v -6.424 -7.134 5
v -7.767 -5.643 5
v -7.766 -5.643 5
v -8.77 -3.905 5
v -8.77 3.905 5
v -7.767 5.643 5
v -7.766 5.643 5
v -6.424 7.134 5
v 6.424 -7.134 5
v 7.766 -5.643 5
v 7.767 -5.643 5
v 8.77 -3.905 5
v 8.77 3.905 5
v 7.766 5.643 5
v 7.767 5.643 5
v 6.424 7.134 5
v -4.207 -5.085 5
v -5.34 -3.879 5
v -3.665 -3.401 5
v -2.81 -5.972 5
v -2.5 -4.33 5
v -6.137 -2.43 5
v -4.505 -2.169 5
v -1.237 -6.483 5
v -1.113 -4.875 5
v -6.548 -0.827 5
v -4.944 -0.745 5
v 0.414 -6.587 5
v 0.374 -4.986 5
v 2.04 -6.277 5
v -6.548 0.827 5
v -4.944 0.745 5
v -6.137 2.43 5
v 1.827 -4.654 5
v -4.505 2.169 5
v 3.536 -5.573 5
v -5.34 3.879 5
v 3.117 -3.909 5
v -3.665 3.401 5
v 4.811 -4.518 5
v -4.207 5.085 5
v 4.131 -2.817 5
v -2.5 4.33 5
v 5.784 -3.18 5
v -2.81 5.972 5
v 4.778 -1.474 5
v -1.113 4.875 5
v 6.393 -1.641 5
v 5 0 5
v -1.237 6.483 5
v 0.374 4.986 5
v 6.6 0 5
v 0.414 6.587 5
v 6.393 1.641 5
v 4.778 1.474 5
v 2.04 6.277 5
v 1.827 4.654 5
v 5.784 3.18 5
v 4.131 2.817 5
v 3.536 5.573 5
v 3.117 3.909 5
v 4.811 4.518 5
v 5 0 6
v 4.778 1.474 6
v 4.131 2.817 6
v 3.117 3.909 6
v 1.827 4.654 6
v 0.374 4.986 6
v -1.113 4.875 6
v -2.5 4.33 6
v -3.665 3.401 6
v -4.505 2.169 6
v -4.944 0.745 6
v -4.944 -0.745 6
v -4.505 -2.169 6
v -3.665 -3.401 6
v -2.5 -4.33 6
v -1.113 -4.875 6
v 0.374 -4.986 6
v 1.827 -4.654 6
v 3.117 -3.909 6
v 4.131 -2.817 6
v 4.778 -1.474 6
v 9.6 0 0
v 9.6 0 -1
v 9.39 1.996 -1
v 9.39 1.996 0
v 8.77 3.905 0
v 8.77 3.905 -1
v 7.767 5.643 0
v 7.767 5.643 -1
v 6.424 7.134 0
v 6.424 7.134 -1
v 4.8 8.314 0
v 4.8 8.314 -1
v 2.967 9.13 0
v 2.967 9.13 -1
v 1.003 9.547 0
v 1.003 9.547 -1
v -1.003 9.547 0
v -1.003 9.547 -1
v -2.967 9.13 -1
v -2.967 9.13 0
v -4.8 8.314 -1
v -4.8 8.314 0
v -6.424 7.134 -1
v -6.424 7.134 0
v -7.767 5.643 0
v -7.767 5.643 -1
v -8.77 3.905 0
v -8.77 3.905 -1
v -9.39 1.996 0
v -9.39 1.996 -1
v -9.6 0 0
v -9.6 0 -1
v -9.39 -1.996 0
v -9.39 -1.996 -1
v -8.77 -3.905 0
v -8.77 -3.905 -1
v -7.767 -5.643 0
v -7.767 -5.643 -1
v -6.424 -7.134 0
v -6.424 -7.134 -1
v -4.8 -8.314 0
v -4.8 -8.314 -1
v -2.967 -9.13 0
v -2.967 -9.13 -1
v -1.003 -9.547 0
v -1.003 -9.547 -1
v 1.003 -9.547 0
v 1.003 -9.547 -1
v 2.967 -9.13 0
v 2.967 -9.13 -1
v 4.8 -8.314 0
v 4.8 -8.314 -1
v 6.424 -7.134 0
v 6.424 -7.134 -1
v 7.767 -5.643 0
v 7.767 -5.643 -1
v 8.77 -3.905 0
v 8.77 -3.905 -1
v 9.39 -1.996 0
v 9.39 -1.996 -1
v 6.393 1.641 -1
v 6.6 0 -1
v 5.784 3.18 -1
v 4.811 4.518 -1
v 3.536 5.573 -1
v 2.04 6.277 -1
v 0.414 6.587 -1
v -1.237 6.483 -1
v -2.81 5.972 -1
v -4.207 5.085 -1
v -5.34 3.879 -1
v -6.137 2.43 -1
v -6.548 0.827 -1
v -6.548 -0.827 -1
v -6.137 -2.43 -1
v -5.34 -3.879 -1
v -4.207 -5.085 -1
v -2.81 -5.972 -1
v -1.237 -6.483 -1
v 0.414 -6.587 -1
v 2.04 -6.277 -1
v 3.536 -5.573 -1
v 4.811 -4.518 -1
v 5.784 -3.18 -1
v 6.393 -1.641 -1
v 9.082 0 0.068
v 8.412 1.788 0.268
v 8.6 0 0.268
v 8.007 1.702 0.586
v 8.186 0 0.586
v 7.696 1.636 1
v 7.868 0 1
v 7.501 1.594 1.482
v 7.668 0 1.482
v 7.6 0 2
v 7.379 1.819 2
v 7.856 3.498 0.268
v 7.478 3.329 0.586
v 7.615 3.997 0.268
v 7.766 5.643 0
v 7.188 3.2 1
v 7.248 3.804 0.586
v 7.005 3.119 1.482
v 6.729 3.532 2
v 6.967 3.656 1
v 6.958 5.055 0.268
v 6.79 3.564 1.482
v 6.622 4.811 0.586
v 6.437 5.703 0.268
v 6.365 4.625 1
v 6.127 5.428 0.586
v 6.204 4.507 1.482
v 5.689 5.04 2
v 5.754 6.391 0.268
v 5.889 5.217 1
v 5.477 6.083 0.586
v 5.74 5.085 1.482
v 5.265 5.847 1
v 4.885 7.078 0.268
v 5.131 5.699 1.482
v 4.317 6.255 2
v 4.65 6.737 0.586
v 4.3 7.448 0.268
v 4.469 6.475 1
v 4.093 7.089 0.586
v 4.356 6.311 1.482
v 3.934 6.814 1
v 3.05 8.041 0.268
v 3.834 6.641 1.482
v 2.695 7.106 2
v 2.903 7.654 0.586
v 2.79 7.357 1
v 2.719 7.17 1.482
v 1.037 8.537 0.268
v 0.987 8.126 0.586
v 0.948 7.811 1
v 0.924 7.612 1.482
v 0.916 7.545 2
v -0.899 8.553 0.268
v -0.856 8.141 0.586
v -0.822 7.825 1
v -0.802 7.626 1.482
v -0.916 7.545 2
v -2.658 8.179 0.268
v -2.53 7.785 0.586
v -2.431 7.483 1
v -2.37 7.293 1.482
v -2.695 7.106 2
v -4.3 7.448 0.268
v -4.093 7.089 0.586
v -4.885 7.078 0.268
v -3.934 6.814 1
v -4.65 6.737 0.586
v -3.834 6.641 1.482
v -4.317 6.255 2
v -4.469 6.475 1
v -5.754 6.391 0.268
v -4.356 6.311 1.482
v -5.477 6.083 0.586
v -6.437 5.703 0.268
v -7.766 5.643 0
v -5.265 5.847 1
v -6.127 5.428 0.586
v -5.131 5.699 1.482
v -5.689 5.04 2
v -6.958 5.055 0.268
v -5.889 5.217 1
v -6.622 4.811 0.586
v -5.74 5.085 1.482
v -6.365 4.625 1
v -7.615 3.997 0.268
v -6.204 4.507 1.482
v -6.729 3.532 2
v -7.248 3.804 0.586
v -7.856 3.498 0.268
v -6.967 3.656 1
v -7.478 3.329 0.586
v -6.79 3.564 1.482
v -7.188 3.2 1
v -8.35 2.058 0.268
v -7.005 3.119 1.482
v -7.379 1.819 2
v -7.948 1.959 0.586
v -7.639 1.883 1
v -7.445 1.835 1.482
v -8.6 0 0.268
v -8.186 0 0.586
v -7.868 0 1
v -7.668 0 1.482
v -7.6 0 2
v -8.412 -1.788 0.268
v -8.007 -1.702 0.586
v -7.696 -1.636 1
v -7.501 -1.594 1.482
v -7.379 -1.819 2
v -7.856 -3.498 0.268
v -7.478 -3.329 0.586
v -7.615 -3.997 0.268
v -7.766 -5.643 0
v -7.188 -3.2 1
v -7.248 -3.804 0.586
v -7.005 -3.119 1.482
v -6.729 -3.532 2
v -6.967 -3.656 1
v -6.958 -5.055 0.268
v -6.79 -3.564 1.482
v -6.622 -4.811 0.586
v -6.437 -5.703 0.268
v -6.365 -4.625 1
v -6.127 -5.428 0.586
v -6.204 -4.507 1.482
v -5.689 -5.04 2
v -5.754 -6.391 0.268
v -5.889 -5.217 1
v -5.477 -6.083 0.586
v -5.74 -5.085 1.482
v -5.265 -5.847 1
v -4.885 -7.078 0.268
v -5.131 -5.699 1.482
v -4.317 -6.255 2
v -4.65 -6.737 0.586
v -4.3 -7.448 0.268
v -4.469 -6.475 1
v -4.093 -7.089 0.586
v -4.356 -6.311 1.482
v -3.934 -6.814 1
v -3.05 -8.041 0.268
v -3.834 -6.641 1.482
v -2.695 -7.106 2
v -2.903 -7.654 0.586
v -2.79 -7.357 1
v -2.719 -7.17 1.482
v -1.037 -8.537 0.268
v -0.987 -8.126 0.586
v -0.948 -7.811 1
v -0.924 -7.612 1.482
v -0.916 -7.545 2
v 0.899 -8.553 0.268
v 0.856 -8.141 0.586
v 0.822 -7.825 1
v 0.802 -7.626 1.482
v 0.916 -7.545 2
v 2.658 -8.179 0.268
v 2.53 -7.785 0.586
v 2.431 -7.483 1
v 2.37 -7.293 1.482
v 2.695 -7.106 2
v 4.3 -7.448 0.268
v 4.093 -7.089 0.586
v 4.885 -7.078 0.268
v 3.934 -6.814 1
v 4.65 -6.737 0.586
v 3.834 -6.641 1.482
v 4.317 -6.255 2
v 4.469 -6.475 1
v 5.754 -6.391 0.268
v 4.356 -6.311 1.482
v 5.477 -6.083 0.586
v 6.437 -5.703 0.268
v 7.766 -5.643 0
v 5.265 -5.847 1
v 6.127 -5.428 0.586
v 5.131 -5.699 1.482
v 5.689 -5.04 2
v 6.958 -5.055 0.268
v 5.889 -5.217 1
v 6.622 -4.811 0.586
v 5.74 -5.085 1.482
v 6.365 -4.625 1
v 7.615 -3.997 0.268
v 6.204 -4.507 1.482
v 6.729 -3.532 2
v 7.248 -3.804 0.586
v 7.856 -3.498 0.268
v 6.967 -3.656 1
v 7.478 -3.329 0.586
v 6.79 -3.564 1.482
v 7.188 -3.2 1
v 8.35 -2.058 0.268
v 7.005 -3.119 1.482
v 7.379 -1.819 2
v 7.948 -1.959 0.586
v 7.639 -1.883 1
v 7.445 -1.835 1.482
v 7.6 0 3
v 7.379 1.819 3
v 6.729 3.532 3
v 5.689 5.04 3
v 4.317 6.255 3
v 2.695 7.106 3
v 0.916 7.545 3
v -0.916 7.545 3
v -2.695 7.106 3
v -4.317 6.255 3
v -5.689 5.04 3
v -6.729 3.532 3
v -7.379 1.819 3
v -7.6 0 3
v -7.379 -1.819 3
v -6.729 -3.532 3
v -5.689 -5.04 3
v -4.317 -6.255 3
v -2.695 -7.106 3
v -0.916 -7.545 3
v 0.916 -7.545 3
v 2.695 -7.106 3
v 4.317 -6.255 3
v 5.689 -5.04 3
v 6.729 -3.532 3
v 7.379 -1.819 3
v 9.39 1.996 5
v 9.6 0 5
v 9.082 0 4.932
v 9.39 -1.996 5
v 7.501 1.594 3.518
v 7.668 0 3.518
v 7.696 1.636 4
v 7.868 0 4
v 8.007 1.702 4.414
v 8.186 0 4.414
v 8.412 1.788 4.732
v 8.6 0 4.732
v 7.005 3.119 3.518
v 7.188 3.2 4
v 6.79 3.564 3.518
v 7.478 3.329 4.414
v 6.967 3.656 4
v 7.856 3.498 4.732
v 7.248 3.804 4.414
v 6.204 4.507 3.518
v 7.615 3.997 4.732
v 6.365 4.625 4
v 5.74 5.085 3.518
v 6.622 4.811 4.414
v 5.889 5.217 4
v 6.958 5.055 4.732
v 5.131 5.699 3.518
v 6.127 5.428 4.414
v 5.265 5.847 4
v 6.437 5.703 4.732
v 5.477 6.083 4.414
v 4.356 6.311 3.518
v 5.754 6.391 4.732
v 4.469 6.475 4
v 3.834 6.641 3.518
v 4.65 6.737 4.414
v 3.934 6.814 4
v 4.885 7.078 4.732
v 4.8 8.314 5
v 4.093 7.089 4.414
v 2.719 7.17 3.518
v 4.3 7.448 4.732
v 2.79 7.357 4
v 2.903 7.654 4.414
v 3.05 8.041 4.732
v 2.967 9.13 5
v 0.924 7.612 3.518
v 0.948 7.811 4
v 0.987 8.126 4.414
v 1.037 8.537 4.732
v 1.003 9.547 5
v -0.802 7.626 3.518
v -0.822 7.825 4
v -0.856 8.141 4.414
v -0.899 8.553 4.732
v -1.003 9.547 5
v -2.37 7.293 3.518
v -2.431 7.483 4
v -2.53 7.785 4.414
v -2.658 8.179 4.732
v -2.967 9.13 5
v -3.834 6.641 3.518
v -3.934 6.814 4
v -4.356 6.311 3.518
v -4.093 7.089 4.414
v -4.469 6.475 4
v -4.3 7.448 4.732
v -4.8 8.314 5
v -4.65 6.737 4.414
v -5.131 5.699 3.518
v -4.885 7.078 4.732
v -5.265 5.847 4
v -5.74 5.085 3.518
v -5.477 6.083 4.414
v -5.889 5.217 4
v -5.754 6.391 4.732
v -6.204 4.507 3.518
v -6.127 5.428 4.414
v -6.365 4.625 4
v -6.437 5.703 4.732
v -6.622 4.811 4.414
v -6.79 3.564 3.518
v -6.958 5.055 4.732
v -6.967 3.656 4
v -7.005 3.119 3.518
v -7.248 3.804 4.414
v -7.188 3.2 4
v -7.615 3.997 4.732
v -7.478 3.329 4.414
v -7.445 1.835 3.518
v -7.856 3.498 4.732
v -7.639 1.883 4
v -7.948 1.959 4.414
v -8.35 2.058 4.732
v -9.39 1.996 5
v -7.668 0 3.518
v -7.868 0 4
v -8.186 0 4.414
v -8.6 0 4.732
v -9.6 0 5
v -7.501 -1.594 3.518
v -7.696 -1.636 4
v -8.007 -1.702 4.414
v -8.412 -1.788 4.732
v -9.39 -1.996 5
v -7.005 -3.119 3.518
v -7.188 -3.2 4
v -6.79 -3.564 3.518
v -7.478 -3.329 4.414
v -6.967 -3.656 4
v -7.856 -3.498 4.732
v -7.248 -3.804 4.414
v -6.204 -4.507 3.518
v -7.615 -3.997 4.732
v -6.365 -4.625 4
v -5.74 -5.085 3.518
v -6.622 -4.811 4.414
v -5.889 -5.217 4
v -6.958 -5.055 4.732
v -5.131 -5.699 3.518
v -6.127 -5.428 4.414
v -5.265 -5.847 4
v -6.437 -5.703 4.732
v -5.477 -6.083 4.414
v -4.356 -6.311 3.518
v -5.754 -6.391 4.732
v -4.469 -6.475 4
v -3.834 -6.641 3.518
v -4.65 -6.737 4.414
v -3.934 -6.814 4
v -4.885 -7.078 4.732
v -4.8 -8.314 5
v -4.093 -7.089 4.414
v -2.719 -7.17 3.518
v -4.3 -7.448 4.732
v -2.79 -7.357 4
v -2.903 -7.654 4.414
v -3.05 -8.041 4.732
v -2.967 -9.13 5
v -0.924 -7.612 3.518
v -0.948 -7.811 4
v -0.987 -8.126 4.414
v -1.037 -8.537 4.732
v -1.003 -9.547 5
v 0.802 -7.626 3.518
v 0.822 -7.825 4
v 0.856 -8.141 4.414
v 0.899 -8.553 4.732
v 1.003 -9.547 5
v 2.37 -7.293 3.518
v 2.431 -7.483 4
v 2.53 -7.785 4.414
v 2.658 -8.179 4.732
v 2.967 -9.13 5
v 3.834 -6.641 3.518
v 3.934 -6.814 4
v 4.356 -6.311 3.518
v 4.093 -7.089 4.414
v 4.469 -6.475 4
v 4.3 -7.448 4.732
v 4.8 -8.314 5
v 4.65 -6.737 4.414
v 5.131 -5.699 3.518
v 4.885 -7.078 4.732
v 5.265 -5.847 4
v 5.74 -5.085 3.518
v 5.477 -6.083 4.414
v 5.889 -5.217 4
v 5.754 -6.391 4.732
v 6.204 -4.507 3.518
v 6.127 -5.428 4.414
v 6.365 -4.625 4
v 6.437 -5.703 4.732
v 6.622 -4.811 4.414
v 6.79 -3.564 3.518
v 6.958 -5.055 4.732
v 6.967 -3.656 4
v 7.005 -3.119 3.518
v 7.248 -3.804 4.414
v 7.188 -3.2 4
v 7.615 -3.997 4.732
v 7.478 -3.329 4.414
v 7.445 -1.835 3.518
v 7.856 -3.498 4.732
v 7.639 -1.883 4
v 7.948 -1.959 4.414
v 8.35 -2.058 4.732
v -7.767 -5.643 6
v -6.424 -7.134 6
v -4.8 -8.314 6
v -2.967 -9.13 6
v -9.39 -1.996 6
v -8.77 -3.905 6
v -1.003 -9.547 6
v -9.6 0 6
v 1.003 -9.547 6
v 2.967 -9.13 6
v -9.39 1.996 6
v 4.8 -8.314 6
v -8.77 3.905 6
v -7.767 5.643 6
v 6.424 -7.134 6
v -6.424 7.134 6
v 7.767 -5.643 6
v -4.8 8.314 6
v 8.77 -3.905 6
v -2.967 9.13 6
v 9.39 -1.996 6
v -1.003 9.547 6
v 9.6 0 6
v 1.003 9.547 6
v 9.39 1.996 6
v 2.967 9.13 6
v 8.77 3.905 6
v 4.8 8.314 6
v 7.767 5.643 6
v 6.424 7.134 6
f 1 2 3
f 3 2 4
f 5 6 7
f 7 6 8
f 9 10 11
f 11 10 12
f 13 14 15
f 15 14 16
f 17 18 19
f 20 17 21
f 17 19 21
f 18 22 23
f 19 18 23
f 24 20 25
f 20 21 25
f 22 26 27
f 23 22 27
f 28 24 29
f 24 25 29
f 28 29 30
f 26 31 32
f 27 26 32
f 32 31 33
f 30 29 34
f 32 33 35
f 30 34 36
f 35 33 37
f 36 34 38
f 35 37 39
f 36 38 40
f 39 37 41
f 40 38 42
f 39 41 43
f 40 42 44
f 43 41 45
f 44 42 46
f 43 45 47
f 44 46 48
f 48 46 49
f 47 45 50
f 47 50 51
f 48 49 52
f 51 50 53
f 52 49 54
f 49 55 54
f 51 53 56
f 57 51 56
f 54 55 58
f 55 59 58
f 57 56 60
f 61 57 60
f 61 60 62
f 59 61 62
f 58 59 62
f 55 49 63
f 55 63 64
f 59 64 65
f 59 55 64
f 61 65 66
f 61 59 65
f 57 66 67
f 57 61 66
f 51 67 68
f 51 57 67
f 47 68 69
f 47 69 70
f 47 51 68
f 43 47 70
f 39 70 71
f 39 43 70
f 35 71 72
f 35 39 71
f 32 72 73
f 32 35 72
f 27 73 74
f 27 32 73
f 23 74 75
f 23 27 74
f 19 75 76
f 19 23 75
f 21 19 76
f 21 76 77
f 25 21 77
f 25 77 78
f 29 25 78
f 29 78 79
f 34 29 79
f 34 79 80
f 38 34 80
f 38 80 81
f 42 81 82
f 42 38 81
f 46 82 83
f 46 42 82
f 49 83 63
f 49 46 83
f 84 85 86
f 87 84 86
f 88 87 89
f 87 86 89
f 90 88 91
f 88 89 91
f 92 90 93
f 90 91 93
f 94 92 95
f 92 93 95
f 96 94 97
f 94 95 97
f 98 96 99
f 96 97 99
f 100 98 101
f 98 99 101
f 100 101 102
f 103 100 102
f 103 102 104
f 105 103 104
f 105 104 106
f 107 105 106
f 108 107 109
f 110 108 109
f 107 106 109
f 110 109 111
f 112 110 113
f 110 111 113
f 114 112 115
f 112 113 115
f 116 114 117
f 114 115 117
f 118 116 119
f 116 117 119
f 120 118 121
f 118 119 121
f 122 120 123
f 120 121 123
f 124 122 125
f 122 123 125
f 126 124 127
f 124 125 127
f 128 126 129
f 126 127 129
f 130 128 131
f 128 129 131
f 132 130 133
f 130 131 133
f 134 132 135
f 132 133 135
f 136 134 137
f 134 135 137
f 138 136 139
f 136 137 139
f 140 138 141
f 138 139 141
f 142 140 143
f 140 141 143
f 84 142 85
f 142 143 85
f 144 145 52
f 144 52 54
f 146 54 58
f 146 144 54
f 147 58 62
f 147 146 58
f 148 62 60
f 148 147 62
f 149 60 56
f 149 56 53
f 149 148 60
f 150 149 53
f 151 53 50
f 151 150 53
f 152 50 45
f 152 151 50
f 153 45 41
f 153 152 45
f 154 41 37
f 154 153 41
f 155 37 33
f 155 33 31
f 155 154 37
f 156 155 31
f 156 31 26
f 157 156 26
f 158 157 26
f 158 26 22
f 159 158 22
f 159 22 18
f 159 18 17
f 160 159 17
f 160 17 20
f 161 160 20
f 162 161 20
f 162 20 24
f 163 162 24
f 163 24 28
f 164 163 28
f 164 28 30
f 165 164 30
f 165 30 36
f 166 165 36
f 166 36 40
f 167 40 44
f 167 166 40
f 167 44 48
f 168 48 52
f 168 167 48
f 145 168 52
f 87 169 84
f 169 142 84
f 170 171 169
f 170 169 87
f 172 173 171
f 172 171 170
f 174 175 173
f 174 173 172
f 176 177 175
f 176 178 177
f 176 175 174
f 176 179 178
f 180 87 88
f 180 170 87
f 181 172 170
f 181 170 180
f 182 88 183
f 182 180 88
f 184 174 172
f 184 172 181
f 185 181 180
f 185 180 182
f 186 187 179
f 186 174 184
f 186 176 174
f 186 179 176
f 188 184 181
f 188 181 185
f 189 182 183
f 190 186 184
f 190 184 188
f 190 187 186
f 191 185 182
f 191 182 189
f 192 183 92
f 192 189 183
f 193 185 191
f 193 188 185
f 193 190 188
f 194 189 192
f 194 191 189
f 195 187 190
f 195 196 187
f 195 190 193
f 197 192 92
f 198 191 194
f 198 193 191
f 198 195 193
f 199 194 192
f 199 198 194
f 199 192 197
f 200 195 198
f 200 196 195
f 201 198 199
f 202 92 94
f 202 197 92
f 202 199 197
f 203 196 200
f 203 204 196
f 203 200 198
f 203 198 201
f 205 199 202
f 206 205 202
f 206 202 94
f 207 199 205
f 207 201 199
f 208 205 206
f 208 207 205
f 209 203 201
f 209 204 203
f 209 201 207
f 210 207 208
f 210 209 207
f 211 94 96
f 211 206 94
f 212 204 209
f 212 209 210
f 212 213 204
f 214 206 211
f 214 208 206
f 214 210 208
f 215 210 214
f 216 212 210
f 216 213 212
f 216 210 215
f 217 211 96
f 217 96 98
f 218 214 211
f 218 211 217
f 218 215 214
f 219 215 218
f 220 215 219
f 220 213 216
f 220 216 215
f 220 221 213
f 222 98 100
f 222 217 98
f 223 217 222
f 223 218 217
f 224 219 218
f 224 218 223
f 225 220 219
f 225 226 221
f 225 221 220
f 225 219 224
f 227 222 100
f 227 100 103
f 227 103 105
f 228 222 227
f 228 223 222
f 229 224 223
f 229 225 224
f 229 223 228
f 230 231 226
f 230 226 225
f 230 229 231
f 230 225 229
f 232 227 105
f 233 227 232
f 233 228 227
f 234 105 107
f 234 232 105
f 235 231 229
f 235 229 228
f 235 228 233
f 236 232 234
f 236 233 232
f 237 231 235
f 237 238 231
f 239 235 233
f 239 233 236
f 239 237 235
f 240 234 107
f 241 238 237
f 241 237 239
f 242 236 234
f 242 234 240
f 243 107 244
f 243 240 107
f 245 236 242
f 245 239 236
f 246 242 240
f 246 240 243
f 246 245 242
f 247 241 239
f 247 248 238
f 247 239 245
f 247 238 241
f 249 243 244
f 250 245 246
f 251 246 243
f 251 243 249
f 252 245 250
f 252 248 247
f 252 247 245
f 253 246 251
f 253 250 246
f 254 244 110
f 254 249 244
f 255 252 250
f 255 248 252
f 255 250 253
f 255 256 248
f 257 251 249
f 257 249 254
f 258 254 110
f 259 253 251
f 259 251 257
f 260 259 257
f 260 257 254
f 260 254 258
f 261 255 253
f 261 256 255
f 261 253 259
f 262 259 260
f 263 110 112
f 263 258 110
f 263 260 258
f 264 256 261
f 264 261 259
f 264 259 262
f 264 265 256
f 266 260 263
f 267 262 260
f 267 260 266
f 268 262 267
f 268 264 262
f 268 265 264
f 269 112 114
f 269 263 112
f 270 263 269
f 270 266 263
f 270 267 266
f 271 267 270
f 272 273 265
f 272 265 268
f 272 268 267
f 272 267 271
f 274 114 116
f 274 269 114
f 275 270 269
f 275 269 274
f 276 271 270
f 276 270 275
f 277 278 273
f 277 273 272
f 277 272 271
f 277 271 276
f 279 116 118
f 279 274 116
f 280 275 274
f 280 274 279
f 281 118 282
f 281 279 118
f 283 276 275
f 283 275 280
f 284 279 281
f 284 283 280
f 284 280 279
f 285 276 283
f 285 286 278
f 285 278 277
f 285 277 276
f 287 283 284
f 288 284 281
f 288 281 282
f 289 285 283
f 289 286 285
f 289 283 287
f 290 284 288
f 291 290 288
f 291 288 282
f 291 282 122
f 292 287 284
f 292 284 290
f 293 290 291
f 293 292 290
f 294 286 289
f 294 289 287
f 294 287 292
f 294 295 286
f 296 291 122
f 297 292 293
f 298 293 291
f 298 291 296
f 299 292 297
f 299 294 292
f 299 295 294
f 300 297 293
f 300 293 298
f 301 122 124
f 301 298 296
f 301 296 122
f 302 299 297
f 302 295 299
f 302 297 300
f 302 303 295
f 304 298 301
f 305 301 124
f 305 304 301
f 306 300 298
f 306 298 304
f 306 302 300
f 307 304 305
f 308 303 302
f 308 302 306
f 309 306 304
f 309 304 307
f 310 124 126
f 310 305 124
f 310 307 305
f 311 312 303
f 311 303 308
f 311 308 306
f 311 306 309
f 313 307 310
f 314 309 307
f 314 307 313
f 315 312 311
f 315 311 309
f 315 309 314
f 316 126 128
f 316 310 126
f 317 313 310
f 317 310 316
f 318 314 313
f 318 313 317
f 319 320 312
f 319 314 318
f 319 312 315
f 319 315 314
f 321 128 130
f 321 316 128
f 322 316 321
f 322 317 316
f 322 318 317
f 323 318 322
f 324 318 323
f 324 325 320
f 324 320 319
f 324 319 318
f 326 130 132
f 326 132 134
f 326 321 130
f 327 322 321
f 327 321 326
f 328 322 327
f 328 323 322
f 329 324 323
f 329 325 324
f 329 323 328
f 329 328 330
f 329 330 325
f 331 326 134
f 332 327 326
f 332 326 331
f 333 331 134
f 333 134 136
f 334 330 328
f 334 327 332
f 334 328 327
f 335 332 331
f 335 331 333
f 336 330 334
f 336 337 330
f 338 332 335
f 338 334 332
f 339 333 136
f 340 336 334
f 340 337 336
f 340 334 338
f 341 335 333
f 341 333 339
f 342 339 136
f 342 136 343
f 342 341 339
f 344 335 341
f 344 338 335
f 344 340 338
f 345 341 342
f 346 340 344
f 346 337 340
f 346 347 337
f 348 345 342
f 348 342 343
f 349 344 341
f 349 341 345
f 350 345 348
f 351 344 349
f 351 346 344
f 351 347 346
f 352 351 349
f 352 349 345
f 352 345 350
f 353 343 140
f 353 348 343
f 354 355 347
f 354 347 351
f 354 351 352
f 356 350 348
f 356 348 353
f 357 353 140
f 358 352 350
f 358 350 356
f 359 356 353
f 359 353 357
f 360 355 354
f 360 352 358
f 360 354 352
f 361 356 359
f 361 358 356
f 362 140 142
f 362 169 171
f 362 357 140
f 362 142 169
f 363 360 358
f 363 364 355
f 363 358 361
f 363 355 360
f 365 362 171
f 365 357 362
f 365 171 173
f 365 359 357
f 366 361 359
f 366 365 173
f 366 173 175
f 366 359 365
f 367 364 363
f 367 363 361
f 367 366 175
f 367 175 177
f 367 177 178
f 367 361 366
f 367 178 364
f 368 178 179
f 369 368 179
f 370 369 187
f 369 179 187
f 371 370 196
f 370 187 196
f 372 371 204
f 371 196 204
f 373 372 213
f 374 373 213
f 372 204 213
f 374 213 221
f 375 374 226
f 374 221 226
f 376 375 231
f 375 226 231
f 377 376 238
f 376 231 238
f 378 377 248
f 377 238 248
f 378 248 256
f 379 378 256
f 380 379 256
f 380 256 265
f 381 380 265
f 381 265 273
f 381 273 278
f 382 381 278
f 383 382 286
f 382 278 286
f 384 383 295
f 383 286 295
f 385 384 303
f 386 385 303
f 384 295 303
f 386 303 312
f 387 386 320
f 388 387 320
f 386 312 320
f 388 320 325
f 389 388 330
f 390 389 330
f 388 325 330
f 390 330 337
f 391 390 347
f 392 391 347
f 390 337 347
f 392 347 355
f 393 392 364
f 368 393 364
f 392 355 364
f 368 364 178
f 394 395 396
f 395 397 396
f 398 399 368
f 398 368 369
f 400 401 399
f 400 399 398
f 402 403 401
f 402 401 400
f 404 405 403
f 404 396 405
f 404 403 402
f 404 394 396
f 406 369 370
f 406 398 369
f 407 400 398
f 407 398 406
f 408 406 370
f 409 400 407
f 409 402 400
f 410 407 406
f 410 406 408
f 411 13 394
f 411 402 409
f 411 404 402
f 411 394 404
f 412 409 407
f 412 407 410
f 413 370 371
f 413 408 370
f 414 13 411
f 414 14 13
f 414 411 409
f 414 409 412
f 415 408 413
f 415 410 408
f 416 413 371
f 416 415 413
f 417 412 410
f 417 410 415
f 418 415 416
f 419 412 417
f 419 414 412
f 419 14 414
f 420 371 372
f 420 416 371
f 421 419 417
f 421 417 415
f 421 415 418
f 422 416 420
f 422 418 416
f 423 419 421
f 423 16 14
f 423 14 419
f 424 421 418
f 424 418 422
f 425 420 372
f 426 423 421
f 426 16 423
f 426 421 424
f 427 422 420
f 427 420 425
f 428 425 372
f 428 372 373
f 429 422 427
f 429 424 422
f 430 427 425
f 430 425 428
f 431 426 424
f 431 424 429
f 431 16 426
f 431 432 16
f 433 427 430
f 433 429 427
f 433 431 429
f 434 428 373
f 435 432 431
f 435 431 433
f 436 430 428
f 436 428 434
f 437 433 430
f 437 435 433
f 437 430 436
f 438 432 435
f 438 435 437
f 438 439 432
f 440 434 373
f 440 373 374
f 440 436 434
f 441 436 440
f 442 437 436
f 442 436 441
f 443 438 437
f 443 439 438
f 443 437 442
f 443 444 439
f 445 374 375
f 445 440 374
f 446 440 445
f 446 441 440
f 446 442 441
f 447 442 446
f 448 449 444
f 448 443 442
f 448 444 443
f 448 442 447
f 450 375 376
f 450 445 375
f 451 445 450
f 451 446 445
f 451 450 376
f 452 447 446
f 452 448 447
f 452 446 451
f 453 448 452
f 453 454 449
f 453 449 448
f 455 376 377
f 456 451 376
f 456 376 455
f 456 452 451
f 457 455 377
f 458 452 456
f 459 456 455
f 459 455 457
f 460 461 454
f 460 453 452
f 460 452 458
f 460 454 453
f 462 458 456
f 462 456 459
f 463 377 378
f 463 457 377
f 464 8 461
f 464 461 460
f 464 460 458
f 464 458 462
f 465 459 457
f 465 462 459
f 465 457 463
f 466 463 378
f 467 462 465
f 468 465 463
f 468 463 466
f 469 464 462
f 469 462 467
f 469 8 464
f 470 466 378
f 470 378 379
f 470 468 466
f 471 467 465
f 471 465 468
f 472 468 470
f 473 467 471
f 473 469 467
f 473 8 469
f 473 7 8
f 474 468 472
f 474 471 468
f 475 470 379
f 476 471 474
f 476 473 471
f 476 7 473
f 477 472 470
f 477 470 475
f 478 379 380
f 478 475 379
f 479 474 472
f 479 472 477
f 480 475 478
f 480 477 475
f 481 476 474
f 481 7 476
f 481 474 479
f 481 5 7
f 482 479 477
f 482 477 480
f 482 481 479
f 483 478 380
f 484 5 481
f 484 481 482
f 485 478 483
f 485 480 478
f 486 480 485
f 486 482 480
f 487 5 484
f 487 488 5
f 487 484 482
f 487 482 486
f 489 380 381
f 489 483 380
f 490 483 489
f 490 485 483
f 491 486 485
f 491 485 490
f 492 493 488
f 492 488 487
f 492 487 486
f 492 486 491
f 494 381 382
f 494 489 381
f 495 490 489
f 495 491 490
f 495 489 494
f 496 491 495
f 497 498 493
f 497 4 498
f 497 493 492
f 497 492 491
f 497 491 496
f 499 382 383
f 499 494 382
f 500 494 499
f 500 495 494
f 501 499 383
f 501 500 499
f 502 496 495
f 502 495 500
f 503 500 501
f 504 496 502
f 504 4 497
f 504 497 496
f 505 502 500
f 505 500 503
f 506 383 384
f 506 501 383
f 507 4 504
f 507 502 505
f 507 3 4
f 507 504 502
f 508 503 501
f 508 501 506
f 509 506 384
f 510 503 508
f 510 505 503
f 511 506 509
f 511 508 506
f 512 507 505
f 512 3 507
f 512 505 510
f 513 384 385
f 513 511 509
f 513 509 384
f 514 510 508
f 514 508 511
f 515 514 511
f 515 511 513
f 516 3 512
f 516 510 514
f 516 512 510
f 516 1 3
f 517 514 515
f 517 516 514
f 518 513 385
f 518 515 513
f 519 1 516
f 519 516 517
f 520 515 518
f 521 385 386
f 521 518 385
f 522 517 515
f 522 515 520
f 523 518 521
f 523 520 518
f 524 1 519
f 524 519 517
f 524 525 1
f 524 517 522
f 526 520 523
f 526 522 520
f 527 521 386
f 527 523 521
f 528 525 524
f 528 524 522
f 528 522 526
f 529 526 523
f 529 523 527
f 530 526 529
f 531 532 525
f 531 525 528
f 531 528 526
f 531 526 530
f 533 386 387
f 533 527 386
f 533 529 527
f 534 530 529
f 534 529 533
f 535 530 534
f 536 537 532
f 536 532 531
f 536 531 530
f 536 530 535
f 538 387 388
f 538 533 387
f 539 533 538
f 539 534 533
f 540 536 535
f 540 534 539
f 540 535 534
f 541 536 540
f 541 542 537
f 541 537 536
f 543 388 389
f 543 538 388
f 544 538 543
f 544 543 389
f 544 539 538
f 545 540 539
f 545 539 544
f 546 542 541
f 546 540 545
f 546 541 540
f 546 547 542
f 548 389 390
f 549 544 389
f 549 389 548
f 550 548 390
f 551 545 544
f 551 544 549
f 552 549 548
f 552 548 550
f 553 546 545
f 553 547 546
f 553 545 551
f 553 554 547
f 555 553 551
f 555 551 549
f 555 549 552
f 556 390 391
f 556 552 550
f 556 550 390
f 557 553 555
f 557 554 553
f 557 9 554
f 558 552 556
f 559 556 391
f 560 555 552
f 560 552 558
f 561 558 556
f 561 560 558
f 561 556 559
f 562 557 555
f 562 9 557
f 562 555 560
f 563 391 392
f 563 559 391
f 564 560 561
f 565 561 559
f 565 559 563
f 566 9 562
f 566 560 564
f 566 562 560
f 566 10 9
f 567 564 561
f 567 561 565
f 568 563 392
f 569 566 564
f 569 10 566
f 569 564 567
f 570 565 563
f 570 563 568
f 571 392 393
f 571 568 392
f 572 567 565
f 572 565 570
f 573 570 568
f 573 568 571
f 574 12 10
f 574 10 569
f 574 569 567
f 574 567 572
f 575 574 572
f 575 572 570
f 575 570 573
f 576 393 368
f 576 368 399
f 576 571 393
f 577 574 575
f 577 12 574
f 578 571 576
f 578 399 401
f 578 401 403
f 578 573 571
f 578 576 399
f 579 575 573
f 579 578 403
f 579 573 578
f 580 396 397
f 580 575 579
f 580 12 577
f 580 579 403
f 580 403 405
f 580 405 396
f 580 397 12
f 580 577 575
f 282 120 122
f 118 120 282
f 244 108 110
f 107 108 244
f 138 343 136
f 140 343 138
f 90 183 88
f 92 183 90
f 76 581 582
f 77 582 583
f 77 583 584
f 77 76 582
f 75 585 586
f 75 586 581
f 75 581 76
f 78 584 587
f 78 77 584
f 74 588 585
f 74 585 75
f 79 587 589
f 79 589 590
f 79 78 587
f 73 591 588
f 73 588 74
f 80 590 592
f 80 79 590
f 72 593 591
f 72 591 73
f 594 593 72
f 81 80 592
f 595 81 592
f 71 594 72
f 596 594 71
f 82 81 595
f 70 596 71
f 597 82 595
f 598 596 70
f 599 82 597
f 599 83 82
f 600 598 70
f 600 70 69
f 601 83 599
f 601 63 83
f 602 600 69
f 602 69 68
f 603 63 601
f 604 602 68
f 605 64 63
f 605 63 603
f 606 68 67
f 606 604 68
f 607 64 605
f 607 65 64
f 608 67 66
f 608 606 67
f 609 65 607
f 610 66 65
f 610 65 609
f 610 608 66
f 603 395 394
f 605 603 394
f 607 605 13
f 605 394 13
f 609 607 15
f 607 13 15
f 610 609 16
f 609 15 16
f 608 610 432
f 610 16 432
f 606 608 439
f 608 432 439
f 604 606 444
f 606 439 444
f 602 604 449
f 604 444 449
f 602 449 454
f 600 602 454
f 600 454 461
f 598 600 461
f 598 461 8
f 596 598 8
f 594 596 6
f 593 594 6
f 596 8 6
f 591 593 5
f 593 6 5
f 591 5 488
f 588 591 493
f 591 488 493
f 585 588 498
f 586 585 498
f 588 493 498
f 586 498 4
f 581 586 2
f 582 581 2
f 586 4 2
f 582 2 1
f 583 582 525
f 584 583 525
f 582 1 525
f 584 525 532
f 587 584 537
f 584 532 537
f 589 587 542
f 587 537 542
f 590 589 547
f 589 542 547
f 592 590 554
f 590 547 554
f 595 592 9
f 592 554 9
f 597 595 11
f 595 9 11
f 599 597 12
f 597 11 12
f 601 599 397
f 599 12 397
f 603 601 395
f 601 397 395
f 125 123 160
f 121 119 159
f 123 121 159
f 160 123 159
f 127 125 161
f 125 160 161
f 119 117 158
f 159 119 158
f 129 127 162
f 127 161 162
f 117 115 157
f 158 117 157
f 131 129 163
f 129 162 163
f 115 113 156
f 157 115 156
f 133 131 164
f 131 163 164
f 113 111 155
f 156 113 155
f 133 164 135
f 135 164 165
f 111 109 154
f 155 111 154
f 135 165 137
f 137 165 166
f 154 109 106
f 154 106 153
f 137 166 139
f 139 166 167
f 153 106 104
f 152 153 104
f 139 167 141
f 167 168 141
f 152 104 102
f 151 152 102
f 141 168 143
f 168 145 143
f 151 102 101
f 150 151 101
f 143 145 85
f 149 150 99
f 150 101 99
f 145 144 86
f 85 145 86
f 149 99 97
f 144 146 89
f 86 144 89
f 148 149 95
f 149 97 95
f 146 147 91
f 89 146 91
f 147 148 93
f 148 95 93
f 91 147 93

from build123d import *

# Parameters (mm, degrees)
CROQUIS1_R              = 7.6
CROQUIS1_R_2            = 6.6
SALIENTE_EXTRUIR1_DEPTH = 5
CROQUIS3_R              = 9.6
CROQUIS3_R_2            = 7.6
CROQUIS3_R_3            = 6.6
CROQUIS3_R_4            = 5
SALIENTE_EXTRUIR2_DEPTH = 1
BOSS_EXTRUDE1_START     = -6
CROQUIS3_4_R            = 9.6
CROQUIS3_4_R_2          = 7.6
CROQUIS3_4_R_3          = 6.6
BOSS_EXTRUDE1_DEPTH     = 1
REDONDEO1_R             = 2


with BuildPart() as part:
    # Croquis1 → Saliente-Extruir1 (new body)
    with BuildSketch(Plane.XY):
        Circle(CROQUIS1_R)
        Circle(CROQUIS1_R_2, mode=Mode.SUBTRACT)
    extrude(amount=SALIENTE_EXTRUIR1_DEPTH)

    # Croquis3 → Saliente-Extruir2 (add)
    # profile 1 of 3: a face of its own
    with BuildSketch(Plane.XY.offset(5)):
        Circle(CROQUIS3_R)
        Circle(CROQUIS3_R_2, mode=Mode.SUBTRACT)
    # profile 2 of 3: a face of its own
    with BuildSketch(Plane.XY.offset(5)):
        Circle(CROQUIS3_R_2)
        Circle(CROQUIS3_R_3, mode=Mode.SUBTRACT)
    # profile 3 of 3: a face of its own
    with BuildSketch(Plane.XY.offset(5)):
        Circle(CROQUIS3_R_3)
        Circle(CROQUIS3_R_4, mode=Mode.SUBTRACT)
    extrude(amount=SALIENTE_EXTRUIR2_DEPTH)

    # Croquis3<4> → Boss-Extrude1 (add)
    # profile 1 of 2: a face of its own
    with BuildSketch(Plane.XY.offset(5).offset(BOSS_EXTRUDE1_START)):
        Circle(CROQUIS3_4_R)
        Circle(CROQUIS3_4_R_2, mode=Mode.SUBTRACT)
    # profile 2 of 2: a face of its own
    with BuildSketch(Plane.XY.offset(5).offset(BOSS_EXTRUDE1_START)):
        Circle(CROQUIS3_4_R_2)
        Circle(CROQUIS3_4_R_3, mode=Mode.SUBTRACT)
    extrude(amount=BOSS_EXTRUDE1_DEPTH)

    # Redondeo1
    redondeo1_edges = [part.edges().sort_by_distance(p)[0] for p in [
        (-7.6, 0, 0),
        (-7.6, 0, 5),
    ]]
    fillet(redondeo1_edges, radius=REDONDEO1_R - 0.0001)  # a hair under: the kernel refuses the full size


solid = part.part
